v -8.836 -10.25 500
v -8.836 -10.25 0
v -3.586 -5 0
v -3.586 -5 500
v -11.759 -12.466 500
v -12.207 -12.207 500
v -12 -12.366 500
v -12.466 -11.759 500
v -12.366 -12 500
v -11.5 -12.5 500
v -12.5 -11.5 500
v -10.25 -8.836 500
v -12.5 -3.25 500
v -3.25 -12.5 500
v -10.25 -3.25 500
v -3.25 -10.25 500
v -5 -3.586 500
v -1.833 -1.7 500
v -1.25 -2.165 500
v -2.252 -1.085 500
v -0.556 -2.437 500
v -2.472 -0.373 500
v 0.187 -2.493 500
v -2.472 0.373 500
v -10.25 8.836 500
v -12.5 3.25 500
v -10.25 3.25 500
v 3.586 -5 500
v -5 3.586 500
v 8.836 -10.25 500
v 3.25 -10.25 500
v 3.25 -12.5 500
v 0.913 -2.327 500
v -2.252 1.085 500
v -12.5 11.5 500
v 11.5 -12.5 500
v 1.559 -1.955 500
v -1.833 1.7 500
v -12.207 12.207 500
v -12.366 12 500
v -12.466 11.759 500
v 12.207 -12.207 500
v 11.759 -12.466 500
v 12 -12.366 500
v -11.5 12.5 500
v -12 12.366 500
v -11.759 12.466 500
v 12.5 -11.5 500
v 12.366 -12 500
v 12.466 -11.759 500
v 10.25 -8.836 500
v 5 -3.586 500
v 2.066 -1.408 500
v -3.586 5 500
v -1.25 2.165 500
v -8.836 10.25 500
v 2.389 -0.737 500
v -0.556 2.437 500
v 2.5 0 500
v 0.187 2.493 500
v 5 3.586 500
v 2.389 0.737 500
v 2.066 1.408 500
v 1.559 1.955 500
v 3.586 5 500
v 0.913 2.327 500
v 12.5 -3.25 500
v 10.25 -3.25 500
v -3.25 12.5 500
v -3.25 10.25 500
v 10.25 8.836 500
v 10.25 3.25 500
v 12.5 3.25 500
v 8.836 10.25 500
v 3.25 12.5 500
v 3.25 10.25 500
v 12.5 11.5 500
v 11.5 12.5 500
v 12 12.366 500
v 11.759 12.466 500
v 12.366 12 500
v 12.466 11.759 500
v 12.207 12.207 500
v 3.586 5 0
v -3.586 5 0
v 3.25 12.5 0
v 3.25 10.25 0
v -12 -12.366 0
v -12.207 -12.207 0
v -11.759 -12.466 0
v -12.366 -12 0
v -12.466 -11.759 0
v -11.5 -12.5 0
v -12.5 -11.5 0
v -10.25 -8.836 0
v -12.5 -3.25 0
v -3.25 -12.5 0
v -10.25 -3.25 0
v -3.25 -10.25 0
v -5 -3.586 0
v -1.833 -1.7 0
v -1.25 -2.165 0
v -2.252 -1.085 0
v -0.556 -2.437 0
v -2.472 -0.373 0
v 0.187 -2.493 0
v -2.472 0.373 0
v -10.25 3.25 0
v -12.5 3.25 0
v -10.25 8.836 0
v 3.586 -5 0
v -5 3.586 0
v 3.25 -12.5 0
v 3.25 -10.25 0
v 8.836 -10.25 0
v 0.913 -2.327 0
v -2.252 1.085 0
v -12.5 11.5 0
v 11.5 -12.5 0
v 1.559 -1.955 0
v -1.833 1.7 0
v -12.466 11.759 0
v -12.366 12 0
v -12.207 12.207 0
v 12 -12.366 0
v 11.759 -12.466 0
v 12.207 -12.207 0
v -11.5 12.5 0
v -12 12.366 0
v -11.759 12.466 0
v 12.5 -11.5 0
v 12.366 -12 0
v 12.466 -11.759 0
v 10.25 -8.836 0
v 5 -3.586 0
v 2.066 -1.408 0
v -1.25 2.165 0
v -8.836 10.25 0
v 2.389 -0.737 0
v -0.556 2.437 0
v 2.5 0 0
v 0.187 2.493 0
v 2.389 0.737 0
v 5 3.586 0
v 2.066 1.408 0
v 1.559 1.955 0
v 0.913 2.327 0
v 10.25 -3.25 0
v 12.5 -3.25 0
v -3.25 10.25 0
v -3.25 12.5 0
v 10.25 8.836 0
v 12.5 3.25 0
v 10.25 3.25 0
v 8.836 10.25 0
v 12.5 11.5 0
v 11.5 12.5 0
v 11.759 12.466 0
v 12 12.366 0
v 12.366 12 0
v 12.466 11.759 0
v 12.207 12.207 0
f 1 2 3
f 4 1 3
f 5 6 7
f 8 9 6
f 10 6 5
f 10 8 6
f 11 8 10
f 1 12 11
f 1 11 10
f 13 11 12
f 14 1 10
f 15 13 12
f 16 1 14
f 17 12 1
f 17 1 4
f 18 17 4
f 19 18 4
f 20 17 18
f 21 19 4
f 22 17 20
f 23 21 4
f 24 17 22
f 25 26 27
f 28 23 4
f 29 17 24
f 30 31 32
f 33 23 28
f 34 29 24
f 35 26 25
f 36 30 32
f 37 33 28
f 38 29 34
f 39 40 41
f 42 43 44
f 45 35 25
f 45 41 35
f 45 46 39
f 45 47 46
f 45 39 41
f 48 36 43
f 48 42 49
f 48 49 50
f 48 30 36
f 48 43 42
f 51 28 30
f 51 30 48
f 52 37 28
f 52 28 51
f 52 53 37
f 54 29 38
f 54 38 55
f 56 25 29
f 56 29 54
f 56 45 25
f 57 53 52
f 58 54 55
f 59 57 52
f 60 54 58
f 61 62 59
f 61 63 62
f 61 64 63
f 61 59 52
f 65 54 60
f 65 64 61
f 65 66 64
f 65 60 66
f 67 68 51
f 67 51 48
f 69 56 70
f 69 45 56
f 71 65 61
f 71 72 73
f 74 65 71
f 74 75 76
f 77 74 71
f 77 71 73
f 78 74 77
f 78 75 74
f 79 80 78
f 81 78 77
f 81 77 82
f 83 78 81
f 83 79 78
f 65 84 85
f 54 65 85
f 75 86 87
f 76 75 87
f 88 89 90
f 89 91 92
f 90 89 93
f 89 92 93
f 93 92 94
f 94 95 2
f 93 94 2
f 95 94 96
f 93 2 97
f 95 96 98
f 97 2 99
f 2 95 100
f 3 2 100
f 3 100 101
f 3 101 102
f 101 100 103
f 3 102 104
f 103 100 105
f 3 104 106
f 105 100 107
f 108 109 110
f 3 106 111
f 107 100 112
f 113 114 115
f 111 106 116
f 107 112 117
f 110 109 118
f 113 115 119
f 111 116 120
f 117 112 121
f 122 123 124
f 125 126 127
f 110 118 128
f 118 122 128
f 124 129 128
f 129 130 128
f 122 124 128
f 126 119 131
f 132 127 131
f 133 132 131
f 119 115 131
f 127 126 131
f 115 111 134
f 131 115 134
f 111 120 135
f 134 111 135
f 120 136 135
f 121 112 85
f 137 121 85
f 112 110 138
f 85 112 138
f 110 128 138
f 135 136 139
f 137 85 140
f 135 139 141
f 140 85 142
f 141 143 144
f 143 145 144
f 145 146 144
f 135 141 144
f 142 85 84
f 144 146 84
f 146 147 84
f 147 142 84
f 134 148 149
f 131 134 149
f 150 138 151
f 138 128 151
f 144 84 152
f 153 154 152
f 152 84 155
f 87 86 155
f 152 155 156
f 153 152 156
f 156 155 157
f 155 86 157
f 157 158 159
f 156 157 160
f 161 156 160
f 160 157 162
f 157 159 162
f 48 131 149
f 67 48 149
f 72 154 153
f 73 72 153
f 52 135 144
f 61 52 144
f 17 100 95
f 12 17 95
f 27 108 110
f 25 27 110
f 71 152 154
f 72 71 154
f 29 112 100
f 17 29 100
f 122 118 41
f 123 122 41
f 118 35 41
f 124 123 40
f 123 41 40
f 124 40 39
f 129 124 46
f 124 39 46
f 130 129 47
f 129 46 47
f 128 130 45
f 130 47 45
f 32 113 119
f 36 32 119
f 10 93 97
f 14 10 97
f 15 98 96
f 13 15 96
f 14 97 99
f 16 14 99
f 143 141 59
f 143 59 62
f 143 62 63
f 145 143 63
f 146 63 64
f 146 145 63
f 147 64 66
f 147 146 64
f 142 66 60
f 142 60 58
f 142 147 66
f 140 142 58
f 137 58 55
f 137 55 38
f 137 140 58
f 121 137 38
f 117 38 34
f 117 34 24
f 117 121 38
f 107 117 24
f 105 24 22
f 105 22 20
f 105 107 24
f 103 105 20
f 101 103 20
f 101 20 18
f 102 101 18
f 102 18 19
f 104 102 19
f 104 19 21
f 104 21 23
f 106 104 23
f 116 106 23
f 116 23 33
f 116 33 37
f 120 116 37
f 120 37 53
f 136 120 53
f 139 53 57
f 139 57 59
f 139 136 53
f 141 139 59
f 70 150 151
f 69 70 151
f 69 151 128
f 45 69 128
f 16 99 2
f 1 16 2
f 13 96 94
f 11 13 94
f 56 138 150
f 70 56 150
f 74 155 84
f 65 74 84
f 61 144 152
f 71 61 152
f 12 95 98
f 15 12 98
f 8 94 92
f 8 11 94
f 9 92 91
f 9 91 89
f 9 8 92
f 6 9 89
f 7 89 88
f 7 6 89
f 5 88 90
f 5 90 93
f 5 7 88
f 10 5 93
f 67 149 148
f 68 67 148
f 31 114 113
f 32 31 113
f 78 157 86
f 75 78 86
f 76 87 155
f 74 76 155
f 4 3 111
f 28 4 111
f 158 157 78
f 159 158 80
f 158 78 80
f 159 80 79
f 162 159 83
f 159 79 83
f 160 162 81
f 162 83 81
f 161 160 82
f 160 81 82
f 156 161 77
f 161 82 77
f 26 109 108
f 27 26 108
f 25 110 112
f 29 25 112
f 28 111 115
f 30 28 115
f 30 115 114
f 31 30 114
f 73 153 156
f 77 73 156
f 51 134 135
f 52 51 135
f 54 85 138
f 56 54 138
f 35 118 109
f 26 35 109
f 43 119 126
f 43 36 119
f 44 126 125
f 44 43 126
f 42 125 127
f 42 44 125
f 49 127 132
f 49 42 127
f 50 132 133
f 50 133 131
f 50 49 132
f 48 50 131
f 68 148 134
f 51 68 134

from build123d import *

# Parameters (mm, degrees)
SKETCH1_R           = 2.5
BOSS_EXTRUDE1_DEPTH = 500
FILLET1_R           = 1


with BuildPart() as part:
    # Sketch1 → Boss-Extrude1 (new body)
    with BuildSketch(Plane.XY):
        Polygon((-12.5, 12.5), (-12.5, 3.25), (-10.25, 3.25), (-10.25, 8.835786438), (-5, 3.585786438), (-5, -3.585786438), (-10.25, -8.835786438), (-10.25, -3.25), (-12.5, -3.25), (-12.5, -12.5), (-3.25, -12.5), (-3.25, -10.25), (-8.835786438, -10.25), (-3.585786438, -5), (3.585786438, -5), (8.835786438, -10.25), (3.25, -10.25), (3.25, -12.5), (12.5, -12.5), (12.5, -3.25), (10.25, -3.25), (10.25, -8.835786438), (5, -3.585786438), (5, 3.585786438), (10.25, 8.835786438), (10.25, 3.25), (12.5, 3.25), (12.5, 12.5), (3.25, 12.5), (3.25, 10.25), (8.835786438, 10.25), (3.585786438, 5), (-3.585786438, 5), (-8.835786438, 10.25), (-3.25, 10.25), (-3.25, 12.5), align=None)
        Circle(SKETCH1_R, mode=Mode.SUBTRACT)
    extrude(amount=BOSS_EXTRUDE1_DEPTH)

    # Fillet1
    fillet1_edges = [part.edges().sort_by_distance(p)[0] for p in [
        (12.5, 12.5, 250),
        (12.5, -12.5, 250),
        (-12.5, -12.5, 250),
        (-12.5, 12.5, 250),
    ]]
    fillet(fillet1_edges, radius=FILLET1_R)


solid = part.part
